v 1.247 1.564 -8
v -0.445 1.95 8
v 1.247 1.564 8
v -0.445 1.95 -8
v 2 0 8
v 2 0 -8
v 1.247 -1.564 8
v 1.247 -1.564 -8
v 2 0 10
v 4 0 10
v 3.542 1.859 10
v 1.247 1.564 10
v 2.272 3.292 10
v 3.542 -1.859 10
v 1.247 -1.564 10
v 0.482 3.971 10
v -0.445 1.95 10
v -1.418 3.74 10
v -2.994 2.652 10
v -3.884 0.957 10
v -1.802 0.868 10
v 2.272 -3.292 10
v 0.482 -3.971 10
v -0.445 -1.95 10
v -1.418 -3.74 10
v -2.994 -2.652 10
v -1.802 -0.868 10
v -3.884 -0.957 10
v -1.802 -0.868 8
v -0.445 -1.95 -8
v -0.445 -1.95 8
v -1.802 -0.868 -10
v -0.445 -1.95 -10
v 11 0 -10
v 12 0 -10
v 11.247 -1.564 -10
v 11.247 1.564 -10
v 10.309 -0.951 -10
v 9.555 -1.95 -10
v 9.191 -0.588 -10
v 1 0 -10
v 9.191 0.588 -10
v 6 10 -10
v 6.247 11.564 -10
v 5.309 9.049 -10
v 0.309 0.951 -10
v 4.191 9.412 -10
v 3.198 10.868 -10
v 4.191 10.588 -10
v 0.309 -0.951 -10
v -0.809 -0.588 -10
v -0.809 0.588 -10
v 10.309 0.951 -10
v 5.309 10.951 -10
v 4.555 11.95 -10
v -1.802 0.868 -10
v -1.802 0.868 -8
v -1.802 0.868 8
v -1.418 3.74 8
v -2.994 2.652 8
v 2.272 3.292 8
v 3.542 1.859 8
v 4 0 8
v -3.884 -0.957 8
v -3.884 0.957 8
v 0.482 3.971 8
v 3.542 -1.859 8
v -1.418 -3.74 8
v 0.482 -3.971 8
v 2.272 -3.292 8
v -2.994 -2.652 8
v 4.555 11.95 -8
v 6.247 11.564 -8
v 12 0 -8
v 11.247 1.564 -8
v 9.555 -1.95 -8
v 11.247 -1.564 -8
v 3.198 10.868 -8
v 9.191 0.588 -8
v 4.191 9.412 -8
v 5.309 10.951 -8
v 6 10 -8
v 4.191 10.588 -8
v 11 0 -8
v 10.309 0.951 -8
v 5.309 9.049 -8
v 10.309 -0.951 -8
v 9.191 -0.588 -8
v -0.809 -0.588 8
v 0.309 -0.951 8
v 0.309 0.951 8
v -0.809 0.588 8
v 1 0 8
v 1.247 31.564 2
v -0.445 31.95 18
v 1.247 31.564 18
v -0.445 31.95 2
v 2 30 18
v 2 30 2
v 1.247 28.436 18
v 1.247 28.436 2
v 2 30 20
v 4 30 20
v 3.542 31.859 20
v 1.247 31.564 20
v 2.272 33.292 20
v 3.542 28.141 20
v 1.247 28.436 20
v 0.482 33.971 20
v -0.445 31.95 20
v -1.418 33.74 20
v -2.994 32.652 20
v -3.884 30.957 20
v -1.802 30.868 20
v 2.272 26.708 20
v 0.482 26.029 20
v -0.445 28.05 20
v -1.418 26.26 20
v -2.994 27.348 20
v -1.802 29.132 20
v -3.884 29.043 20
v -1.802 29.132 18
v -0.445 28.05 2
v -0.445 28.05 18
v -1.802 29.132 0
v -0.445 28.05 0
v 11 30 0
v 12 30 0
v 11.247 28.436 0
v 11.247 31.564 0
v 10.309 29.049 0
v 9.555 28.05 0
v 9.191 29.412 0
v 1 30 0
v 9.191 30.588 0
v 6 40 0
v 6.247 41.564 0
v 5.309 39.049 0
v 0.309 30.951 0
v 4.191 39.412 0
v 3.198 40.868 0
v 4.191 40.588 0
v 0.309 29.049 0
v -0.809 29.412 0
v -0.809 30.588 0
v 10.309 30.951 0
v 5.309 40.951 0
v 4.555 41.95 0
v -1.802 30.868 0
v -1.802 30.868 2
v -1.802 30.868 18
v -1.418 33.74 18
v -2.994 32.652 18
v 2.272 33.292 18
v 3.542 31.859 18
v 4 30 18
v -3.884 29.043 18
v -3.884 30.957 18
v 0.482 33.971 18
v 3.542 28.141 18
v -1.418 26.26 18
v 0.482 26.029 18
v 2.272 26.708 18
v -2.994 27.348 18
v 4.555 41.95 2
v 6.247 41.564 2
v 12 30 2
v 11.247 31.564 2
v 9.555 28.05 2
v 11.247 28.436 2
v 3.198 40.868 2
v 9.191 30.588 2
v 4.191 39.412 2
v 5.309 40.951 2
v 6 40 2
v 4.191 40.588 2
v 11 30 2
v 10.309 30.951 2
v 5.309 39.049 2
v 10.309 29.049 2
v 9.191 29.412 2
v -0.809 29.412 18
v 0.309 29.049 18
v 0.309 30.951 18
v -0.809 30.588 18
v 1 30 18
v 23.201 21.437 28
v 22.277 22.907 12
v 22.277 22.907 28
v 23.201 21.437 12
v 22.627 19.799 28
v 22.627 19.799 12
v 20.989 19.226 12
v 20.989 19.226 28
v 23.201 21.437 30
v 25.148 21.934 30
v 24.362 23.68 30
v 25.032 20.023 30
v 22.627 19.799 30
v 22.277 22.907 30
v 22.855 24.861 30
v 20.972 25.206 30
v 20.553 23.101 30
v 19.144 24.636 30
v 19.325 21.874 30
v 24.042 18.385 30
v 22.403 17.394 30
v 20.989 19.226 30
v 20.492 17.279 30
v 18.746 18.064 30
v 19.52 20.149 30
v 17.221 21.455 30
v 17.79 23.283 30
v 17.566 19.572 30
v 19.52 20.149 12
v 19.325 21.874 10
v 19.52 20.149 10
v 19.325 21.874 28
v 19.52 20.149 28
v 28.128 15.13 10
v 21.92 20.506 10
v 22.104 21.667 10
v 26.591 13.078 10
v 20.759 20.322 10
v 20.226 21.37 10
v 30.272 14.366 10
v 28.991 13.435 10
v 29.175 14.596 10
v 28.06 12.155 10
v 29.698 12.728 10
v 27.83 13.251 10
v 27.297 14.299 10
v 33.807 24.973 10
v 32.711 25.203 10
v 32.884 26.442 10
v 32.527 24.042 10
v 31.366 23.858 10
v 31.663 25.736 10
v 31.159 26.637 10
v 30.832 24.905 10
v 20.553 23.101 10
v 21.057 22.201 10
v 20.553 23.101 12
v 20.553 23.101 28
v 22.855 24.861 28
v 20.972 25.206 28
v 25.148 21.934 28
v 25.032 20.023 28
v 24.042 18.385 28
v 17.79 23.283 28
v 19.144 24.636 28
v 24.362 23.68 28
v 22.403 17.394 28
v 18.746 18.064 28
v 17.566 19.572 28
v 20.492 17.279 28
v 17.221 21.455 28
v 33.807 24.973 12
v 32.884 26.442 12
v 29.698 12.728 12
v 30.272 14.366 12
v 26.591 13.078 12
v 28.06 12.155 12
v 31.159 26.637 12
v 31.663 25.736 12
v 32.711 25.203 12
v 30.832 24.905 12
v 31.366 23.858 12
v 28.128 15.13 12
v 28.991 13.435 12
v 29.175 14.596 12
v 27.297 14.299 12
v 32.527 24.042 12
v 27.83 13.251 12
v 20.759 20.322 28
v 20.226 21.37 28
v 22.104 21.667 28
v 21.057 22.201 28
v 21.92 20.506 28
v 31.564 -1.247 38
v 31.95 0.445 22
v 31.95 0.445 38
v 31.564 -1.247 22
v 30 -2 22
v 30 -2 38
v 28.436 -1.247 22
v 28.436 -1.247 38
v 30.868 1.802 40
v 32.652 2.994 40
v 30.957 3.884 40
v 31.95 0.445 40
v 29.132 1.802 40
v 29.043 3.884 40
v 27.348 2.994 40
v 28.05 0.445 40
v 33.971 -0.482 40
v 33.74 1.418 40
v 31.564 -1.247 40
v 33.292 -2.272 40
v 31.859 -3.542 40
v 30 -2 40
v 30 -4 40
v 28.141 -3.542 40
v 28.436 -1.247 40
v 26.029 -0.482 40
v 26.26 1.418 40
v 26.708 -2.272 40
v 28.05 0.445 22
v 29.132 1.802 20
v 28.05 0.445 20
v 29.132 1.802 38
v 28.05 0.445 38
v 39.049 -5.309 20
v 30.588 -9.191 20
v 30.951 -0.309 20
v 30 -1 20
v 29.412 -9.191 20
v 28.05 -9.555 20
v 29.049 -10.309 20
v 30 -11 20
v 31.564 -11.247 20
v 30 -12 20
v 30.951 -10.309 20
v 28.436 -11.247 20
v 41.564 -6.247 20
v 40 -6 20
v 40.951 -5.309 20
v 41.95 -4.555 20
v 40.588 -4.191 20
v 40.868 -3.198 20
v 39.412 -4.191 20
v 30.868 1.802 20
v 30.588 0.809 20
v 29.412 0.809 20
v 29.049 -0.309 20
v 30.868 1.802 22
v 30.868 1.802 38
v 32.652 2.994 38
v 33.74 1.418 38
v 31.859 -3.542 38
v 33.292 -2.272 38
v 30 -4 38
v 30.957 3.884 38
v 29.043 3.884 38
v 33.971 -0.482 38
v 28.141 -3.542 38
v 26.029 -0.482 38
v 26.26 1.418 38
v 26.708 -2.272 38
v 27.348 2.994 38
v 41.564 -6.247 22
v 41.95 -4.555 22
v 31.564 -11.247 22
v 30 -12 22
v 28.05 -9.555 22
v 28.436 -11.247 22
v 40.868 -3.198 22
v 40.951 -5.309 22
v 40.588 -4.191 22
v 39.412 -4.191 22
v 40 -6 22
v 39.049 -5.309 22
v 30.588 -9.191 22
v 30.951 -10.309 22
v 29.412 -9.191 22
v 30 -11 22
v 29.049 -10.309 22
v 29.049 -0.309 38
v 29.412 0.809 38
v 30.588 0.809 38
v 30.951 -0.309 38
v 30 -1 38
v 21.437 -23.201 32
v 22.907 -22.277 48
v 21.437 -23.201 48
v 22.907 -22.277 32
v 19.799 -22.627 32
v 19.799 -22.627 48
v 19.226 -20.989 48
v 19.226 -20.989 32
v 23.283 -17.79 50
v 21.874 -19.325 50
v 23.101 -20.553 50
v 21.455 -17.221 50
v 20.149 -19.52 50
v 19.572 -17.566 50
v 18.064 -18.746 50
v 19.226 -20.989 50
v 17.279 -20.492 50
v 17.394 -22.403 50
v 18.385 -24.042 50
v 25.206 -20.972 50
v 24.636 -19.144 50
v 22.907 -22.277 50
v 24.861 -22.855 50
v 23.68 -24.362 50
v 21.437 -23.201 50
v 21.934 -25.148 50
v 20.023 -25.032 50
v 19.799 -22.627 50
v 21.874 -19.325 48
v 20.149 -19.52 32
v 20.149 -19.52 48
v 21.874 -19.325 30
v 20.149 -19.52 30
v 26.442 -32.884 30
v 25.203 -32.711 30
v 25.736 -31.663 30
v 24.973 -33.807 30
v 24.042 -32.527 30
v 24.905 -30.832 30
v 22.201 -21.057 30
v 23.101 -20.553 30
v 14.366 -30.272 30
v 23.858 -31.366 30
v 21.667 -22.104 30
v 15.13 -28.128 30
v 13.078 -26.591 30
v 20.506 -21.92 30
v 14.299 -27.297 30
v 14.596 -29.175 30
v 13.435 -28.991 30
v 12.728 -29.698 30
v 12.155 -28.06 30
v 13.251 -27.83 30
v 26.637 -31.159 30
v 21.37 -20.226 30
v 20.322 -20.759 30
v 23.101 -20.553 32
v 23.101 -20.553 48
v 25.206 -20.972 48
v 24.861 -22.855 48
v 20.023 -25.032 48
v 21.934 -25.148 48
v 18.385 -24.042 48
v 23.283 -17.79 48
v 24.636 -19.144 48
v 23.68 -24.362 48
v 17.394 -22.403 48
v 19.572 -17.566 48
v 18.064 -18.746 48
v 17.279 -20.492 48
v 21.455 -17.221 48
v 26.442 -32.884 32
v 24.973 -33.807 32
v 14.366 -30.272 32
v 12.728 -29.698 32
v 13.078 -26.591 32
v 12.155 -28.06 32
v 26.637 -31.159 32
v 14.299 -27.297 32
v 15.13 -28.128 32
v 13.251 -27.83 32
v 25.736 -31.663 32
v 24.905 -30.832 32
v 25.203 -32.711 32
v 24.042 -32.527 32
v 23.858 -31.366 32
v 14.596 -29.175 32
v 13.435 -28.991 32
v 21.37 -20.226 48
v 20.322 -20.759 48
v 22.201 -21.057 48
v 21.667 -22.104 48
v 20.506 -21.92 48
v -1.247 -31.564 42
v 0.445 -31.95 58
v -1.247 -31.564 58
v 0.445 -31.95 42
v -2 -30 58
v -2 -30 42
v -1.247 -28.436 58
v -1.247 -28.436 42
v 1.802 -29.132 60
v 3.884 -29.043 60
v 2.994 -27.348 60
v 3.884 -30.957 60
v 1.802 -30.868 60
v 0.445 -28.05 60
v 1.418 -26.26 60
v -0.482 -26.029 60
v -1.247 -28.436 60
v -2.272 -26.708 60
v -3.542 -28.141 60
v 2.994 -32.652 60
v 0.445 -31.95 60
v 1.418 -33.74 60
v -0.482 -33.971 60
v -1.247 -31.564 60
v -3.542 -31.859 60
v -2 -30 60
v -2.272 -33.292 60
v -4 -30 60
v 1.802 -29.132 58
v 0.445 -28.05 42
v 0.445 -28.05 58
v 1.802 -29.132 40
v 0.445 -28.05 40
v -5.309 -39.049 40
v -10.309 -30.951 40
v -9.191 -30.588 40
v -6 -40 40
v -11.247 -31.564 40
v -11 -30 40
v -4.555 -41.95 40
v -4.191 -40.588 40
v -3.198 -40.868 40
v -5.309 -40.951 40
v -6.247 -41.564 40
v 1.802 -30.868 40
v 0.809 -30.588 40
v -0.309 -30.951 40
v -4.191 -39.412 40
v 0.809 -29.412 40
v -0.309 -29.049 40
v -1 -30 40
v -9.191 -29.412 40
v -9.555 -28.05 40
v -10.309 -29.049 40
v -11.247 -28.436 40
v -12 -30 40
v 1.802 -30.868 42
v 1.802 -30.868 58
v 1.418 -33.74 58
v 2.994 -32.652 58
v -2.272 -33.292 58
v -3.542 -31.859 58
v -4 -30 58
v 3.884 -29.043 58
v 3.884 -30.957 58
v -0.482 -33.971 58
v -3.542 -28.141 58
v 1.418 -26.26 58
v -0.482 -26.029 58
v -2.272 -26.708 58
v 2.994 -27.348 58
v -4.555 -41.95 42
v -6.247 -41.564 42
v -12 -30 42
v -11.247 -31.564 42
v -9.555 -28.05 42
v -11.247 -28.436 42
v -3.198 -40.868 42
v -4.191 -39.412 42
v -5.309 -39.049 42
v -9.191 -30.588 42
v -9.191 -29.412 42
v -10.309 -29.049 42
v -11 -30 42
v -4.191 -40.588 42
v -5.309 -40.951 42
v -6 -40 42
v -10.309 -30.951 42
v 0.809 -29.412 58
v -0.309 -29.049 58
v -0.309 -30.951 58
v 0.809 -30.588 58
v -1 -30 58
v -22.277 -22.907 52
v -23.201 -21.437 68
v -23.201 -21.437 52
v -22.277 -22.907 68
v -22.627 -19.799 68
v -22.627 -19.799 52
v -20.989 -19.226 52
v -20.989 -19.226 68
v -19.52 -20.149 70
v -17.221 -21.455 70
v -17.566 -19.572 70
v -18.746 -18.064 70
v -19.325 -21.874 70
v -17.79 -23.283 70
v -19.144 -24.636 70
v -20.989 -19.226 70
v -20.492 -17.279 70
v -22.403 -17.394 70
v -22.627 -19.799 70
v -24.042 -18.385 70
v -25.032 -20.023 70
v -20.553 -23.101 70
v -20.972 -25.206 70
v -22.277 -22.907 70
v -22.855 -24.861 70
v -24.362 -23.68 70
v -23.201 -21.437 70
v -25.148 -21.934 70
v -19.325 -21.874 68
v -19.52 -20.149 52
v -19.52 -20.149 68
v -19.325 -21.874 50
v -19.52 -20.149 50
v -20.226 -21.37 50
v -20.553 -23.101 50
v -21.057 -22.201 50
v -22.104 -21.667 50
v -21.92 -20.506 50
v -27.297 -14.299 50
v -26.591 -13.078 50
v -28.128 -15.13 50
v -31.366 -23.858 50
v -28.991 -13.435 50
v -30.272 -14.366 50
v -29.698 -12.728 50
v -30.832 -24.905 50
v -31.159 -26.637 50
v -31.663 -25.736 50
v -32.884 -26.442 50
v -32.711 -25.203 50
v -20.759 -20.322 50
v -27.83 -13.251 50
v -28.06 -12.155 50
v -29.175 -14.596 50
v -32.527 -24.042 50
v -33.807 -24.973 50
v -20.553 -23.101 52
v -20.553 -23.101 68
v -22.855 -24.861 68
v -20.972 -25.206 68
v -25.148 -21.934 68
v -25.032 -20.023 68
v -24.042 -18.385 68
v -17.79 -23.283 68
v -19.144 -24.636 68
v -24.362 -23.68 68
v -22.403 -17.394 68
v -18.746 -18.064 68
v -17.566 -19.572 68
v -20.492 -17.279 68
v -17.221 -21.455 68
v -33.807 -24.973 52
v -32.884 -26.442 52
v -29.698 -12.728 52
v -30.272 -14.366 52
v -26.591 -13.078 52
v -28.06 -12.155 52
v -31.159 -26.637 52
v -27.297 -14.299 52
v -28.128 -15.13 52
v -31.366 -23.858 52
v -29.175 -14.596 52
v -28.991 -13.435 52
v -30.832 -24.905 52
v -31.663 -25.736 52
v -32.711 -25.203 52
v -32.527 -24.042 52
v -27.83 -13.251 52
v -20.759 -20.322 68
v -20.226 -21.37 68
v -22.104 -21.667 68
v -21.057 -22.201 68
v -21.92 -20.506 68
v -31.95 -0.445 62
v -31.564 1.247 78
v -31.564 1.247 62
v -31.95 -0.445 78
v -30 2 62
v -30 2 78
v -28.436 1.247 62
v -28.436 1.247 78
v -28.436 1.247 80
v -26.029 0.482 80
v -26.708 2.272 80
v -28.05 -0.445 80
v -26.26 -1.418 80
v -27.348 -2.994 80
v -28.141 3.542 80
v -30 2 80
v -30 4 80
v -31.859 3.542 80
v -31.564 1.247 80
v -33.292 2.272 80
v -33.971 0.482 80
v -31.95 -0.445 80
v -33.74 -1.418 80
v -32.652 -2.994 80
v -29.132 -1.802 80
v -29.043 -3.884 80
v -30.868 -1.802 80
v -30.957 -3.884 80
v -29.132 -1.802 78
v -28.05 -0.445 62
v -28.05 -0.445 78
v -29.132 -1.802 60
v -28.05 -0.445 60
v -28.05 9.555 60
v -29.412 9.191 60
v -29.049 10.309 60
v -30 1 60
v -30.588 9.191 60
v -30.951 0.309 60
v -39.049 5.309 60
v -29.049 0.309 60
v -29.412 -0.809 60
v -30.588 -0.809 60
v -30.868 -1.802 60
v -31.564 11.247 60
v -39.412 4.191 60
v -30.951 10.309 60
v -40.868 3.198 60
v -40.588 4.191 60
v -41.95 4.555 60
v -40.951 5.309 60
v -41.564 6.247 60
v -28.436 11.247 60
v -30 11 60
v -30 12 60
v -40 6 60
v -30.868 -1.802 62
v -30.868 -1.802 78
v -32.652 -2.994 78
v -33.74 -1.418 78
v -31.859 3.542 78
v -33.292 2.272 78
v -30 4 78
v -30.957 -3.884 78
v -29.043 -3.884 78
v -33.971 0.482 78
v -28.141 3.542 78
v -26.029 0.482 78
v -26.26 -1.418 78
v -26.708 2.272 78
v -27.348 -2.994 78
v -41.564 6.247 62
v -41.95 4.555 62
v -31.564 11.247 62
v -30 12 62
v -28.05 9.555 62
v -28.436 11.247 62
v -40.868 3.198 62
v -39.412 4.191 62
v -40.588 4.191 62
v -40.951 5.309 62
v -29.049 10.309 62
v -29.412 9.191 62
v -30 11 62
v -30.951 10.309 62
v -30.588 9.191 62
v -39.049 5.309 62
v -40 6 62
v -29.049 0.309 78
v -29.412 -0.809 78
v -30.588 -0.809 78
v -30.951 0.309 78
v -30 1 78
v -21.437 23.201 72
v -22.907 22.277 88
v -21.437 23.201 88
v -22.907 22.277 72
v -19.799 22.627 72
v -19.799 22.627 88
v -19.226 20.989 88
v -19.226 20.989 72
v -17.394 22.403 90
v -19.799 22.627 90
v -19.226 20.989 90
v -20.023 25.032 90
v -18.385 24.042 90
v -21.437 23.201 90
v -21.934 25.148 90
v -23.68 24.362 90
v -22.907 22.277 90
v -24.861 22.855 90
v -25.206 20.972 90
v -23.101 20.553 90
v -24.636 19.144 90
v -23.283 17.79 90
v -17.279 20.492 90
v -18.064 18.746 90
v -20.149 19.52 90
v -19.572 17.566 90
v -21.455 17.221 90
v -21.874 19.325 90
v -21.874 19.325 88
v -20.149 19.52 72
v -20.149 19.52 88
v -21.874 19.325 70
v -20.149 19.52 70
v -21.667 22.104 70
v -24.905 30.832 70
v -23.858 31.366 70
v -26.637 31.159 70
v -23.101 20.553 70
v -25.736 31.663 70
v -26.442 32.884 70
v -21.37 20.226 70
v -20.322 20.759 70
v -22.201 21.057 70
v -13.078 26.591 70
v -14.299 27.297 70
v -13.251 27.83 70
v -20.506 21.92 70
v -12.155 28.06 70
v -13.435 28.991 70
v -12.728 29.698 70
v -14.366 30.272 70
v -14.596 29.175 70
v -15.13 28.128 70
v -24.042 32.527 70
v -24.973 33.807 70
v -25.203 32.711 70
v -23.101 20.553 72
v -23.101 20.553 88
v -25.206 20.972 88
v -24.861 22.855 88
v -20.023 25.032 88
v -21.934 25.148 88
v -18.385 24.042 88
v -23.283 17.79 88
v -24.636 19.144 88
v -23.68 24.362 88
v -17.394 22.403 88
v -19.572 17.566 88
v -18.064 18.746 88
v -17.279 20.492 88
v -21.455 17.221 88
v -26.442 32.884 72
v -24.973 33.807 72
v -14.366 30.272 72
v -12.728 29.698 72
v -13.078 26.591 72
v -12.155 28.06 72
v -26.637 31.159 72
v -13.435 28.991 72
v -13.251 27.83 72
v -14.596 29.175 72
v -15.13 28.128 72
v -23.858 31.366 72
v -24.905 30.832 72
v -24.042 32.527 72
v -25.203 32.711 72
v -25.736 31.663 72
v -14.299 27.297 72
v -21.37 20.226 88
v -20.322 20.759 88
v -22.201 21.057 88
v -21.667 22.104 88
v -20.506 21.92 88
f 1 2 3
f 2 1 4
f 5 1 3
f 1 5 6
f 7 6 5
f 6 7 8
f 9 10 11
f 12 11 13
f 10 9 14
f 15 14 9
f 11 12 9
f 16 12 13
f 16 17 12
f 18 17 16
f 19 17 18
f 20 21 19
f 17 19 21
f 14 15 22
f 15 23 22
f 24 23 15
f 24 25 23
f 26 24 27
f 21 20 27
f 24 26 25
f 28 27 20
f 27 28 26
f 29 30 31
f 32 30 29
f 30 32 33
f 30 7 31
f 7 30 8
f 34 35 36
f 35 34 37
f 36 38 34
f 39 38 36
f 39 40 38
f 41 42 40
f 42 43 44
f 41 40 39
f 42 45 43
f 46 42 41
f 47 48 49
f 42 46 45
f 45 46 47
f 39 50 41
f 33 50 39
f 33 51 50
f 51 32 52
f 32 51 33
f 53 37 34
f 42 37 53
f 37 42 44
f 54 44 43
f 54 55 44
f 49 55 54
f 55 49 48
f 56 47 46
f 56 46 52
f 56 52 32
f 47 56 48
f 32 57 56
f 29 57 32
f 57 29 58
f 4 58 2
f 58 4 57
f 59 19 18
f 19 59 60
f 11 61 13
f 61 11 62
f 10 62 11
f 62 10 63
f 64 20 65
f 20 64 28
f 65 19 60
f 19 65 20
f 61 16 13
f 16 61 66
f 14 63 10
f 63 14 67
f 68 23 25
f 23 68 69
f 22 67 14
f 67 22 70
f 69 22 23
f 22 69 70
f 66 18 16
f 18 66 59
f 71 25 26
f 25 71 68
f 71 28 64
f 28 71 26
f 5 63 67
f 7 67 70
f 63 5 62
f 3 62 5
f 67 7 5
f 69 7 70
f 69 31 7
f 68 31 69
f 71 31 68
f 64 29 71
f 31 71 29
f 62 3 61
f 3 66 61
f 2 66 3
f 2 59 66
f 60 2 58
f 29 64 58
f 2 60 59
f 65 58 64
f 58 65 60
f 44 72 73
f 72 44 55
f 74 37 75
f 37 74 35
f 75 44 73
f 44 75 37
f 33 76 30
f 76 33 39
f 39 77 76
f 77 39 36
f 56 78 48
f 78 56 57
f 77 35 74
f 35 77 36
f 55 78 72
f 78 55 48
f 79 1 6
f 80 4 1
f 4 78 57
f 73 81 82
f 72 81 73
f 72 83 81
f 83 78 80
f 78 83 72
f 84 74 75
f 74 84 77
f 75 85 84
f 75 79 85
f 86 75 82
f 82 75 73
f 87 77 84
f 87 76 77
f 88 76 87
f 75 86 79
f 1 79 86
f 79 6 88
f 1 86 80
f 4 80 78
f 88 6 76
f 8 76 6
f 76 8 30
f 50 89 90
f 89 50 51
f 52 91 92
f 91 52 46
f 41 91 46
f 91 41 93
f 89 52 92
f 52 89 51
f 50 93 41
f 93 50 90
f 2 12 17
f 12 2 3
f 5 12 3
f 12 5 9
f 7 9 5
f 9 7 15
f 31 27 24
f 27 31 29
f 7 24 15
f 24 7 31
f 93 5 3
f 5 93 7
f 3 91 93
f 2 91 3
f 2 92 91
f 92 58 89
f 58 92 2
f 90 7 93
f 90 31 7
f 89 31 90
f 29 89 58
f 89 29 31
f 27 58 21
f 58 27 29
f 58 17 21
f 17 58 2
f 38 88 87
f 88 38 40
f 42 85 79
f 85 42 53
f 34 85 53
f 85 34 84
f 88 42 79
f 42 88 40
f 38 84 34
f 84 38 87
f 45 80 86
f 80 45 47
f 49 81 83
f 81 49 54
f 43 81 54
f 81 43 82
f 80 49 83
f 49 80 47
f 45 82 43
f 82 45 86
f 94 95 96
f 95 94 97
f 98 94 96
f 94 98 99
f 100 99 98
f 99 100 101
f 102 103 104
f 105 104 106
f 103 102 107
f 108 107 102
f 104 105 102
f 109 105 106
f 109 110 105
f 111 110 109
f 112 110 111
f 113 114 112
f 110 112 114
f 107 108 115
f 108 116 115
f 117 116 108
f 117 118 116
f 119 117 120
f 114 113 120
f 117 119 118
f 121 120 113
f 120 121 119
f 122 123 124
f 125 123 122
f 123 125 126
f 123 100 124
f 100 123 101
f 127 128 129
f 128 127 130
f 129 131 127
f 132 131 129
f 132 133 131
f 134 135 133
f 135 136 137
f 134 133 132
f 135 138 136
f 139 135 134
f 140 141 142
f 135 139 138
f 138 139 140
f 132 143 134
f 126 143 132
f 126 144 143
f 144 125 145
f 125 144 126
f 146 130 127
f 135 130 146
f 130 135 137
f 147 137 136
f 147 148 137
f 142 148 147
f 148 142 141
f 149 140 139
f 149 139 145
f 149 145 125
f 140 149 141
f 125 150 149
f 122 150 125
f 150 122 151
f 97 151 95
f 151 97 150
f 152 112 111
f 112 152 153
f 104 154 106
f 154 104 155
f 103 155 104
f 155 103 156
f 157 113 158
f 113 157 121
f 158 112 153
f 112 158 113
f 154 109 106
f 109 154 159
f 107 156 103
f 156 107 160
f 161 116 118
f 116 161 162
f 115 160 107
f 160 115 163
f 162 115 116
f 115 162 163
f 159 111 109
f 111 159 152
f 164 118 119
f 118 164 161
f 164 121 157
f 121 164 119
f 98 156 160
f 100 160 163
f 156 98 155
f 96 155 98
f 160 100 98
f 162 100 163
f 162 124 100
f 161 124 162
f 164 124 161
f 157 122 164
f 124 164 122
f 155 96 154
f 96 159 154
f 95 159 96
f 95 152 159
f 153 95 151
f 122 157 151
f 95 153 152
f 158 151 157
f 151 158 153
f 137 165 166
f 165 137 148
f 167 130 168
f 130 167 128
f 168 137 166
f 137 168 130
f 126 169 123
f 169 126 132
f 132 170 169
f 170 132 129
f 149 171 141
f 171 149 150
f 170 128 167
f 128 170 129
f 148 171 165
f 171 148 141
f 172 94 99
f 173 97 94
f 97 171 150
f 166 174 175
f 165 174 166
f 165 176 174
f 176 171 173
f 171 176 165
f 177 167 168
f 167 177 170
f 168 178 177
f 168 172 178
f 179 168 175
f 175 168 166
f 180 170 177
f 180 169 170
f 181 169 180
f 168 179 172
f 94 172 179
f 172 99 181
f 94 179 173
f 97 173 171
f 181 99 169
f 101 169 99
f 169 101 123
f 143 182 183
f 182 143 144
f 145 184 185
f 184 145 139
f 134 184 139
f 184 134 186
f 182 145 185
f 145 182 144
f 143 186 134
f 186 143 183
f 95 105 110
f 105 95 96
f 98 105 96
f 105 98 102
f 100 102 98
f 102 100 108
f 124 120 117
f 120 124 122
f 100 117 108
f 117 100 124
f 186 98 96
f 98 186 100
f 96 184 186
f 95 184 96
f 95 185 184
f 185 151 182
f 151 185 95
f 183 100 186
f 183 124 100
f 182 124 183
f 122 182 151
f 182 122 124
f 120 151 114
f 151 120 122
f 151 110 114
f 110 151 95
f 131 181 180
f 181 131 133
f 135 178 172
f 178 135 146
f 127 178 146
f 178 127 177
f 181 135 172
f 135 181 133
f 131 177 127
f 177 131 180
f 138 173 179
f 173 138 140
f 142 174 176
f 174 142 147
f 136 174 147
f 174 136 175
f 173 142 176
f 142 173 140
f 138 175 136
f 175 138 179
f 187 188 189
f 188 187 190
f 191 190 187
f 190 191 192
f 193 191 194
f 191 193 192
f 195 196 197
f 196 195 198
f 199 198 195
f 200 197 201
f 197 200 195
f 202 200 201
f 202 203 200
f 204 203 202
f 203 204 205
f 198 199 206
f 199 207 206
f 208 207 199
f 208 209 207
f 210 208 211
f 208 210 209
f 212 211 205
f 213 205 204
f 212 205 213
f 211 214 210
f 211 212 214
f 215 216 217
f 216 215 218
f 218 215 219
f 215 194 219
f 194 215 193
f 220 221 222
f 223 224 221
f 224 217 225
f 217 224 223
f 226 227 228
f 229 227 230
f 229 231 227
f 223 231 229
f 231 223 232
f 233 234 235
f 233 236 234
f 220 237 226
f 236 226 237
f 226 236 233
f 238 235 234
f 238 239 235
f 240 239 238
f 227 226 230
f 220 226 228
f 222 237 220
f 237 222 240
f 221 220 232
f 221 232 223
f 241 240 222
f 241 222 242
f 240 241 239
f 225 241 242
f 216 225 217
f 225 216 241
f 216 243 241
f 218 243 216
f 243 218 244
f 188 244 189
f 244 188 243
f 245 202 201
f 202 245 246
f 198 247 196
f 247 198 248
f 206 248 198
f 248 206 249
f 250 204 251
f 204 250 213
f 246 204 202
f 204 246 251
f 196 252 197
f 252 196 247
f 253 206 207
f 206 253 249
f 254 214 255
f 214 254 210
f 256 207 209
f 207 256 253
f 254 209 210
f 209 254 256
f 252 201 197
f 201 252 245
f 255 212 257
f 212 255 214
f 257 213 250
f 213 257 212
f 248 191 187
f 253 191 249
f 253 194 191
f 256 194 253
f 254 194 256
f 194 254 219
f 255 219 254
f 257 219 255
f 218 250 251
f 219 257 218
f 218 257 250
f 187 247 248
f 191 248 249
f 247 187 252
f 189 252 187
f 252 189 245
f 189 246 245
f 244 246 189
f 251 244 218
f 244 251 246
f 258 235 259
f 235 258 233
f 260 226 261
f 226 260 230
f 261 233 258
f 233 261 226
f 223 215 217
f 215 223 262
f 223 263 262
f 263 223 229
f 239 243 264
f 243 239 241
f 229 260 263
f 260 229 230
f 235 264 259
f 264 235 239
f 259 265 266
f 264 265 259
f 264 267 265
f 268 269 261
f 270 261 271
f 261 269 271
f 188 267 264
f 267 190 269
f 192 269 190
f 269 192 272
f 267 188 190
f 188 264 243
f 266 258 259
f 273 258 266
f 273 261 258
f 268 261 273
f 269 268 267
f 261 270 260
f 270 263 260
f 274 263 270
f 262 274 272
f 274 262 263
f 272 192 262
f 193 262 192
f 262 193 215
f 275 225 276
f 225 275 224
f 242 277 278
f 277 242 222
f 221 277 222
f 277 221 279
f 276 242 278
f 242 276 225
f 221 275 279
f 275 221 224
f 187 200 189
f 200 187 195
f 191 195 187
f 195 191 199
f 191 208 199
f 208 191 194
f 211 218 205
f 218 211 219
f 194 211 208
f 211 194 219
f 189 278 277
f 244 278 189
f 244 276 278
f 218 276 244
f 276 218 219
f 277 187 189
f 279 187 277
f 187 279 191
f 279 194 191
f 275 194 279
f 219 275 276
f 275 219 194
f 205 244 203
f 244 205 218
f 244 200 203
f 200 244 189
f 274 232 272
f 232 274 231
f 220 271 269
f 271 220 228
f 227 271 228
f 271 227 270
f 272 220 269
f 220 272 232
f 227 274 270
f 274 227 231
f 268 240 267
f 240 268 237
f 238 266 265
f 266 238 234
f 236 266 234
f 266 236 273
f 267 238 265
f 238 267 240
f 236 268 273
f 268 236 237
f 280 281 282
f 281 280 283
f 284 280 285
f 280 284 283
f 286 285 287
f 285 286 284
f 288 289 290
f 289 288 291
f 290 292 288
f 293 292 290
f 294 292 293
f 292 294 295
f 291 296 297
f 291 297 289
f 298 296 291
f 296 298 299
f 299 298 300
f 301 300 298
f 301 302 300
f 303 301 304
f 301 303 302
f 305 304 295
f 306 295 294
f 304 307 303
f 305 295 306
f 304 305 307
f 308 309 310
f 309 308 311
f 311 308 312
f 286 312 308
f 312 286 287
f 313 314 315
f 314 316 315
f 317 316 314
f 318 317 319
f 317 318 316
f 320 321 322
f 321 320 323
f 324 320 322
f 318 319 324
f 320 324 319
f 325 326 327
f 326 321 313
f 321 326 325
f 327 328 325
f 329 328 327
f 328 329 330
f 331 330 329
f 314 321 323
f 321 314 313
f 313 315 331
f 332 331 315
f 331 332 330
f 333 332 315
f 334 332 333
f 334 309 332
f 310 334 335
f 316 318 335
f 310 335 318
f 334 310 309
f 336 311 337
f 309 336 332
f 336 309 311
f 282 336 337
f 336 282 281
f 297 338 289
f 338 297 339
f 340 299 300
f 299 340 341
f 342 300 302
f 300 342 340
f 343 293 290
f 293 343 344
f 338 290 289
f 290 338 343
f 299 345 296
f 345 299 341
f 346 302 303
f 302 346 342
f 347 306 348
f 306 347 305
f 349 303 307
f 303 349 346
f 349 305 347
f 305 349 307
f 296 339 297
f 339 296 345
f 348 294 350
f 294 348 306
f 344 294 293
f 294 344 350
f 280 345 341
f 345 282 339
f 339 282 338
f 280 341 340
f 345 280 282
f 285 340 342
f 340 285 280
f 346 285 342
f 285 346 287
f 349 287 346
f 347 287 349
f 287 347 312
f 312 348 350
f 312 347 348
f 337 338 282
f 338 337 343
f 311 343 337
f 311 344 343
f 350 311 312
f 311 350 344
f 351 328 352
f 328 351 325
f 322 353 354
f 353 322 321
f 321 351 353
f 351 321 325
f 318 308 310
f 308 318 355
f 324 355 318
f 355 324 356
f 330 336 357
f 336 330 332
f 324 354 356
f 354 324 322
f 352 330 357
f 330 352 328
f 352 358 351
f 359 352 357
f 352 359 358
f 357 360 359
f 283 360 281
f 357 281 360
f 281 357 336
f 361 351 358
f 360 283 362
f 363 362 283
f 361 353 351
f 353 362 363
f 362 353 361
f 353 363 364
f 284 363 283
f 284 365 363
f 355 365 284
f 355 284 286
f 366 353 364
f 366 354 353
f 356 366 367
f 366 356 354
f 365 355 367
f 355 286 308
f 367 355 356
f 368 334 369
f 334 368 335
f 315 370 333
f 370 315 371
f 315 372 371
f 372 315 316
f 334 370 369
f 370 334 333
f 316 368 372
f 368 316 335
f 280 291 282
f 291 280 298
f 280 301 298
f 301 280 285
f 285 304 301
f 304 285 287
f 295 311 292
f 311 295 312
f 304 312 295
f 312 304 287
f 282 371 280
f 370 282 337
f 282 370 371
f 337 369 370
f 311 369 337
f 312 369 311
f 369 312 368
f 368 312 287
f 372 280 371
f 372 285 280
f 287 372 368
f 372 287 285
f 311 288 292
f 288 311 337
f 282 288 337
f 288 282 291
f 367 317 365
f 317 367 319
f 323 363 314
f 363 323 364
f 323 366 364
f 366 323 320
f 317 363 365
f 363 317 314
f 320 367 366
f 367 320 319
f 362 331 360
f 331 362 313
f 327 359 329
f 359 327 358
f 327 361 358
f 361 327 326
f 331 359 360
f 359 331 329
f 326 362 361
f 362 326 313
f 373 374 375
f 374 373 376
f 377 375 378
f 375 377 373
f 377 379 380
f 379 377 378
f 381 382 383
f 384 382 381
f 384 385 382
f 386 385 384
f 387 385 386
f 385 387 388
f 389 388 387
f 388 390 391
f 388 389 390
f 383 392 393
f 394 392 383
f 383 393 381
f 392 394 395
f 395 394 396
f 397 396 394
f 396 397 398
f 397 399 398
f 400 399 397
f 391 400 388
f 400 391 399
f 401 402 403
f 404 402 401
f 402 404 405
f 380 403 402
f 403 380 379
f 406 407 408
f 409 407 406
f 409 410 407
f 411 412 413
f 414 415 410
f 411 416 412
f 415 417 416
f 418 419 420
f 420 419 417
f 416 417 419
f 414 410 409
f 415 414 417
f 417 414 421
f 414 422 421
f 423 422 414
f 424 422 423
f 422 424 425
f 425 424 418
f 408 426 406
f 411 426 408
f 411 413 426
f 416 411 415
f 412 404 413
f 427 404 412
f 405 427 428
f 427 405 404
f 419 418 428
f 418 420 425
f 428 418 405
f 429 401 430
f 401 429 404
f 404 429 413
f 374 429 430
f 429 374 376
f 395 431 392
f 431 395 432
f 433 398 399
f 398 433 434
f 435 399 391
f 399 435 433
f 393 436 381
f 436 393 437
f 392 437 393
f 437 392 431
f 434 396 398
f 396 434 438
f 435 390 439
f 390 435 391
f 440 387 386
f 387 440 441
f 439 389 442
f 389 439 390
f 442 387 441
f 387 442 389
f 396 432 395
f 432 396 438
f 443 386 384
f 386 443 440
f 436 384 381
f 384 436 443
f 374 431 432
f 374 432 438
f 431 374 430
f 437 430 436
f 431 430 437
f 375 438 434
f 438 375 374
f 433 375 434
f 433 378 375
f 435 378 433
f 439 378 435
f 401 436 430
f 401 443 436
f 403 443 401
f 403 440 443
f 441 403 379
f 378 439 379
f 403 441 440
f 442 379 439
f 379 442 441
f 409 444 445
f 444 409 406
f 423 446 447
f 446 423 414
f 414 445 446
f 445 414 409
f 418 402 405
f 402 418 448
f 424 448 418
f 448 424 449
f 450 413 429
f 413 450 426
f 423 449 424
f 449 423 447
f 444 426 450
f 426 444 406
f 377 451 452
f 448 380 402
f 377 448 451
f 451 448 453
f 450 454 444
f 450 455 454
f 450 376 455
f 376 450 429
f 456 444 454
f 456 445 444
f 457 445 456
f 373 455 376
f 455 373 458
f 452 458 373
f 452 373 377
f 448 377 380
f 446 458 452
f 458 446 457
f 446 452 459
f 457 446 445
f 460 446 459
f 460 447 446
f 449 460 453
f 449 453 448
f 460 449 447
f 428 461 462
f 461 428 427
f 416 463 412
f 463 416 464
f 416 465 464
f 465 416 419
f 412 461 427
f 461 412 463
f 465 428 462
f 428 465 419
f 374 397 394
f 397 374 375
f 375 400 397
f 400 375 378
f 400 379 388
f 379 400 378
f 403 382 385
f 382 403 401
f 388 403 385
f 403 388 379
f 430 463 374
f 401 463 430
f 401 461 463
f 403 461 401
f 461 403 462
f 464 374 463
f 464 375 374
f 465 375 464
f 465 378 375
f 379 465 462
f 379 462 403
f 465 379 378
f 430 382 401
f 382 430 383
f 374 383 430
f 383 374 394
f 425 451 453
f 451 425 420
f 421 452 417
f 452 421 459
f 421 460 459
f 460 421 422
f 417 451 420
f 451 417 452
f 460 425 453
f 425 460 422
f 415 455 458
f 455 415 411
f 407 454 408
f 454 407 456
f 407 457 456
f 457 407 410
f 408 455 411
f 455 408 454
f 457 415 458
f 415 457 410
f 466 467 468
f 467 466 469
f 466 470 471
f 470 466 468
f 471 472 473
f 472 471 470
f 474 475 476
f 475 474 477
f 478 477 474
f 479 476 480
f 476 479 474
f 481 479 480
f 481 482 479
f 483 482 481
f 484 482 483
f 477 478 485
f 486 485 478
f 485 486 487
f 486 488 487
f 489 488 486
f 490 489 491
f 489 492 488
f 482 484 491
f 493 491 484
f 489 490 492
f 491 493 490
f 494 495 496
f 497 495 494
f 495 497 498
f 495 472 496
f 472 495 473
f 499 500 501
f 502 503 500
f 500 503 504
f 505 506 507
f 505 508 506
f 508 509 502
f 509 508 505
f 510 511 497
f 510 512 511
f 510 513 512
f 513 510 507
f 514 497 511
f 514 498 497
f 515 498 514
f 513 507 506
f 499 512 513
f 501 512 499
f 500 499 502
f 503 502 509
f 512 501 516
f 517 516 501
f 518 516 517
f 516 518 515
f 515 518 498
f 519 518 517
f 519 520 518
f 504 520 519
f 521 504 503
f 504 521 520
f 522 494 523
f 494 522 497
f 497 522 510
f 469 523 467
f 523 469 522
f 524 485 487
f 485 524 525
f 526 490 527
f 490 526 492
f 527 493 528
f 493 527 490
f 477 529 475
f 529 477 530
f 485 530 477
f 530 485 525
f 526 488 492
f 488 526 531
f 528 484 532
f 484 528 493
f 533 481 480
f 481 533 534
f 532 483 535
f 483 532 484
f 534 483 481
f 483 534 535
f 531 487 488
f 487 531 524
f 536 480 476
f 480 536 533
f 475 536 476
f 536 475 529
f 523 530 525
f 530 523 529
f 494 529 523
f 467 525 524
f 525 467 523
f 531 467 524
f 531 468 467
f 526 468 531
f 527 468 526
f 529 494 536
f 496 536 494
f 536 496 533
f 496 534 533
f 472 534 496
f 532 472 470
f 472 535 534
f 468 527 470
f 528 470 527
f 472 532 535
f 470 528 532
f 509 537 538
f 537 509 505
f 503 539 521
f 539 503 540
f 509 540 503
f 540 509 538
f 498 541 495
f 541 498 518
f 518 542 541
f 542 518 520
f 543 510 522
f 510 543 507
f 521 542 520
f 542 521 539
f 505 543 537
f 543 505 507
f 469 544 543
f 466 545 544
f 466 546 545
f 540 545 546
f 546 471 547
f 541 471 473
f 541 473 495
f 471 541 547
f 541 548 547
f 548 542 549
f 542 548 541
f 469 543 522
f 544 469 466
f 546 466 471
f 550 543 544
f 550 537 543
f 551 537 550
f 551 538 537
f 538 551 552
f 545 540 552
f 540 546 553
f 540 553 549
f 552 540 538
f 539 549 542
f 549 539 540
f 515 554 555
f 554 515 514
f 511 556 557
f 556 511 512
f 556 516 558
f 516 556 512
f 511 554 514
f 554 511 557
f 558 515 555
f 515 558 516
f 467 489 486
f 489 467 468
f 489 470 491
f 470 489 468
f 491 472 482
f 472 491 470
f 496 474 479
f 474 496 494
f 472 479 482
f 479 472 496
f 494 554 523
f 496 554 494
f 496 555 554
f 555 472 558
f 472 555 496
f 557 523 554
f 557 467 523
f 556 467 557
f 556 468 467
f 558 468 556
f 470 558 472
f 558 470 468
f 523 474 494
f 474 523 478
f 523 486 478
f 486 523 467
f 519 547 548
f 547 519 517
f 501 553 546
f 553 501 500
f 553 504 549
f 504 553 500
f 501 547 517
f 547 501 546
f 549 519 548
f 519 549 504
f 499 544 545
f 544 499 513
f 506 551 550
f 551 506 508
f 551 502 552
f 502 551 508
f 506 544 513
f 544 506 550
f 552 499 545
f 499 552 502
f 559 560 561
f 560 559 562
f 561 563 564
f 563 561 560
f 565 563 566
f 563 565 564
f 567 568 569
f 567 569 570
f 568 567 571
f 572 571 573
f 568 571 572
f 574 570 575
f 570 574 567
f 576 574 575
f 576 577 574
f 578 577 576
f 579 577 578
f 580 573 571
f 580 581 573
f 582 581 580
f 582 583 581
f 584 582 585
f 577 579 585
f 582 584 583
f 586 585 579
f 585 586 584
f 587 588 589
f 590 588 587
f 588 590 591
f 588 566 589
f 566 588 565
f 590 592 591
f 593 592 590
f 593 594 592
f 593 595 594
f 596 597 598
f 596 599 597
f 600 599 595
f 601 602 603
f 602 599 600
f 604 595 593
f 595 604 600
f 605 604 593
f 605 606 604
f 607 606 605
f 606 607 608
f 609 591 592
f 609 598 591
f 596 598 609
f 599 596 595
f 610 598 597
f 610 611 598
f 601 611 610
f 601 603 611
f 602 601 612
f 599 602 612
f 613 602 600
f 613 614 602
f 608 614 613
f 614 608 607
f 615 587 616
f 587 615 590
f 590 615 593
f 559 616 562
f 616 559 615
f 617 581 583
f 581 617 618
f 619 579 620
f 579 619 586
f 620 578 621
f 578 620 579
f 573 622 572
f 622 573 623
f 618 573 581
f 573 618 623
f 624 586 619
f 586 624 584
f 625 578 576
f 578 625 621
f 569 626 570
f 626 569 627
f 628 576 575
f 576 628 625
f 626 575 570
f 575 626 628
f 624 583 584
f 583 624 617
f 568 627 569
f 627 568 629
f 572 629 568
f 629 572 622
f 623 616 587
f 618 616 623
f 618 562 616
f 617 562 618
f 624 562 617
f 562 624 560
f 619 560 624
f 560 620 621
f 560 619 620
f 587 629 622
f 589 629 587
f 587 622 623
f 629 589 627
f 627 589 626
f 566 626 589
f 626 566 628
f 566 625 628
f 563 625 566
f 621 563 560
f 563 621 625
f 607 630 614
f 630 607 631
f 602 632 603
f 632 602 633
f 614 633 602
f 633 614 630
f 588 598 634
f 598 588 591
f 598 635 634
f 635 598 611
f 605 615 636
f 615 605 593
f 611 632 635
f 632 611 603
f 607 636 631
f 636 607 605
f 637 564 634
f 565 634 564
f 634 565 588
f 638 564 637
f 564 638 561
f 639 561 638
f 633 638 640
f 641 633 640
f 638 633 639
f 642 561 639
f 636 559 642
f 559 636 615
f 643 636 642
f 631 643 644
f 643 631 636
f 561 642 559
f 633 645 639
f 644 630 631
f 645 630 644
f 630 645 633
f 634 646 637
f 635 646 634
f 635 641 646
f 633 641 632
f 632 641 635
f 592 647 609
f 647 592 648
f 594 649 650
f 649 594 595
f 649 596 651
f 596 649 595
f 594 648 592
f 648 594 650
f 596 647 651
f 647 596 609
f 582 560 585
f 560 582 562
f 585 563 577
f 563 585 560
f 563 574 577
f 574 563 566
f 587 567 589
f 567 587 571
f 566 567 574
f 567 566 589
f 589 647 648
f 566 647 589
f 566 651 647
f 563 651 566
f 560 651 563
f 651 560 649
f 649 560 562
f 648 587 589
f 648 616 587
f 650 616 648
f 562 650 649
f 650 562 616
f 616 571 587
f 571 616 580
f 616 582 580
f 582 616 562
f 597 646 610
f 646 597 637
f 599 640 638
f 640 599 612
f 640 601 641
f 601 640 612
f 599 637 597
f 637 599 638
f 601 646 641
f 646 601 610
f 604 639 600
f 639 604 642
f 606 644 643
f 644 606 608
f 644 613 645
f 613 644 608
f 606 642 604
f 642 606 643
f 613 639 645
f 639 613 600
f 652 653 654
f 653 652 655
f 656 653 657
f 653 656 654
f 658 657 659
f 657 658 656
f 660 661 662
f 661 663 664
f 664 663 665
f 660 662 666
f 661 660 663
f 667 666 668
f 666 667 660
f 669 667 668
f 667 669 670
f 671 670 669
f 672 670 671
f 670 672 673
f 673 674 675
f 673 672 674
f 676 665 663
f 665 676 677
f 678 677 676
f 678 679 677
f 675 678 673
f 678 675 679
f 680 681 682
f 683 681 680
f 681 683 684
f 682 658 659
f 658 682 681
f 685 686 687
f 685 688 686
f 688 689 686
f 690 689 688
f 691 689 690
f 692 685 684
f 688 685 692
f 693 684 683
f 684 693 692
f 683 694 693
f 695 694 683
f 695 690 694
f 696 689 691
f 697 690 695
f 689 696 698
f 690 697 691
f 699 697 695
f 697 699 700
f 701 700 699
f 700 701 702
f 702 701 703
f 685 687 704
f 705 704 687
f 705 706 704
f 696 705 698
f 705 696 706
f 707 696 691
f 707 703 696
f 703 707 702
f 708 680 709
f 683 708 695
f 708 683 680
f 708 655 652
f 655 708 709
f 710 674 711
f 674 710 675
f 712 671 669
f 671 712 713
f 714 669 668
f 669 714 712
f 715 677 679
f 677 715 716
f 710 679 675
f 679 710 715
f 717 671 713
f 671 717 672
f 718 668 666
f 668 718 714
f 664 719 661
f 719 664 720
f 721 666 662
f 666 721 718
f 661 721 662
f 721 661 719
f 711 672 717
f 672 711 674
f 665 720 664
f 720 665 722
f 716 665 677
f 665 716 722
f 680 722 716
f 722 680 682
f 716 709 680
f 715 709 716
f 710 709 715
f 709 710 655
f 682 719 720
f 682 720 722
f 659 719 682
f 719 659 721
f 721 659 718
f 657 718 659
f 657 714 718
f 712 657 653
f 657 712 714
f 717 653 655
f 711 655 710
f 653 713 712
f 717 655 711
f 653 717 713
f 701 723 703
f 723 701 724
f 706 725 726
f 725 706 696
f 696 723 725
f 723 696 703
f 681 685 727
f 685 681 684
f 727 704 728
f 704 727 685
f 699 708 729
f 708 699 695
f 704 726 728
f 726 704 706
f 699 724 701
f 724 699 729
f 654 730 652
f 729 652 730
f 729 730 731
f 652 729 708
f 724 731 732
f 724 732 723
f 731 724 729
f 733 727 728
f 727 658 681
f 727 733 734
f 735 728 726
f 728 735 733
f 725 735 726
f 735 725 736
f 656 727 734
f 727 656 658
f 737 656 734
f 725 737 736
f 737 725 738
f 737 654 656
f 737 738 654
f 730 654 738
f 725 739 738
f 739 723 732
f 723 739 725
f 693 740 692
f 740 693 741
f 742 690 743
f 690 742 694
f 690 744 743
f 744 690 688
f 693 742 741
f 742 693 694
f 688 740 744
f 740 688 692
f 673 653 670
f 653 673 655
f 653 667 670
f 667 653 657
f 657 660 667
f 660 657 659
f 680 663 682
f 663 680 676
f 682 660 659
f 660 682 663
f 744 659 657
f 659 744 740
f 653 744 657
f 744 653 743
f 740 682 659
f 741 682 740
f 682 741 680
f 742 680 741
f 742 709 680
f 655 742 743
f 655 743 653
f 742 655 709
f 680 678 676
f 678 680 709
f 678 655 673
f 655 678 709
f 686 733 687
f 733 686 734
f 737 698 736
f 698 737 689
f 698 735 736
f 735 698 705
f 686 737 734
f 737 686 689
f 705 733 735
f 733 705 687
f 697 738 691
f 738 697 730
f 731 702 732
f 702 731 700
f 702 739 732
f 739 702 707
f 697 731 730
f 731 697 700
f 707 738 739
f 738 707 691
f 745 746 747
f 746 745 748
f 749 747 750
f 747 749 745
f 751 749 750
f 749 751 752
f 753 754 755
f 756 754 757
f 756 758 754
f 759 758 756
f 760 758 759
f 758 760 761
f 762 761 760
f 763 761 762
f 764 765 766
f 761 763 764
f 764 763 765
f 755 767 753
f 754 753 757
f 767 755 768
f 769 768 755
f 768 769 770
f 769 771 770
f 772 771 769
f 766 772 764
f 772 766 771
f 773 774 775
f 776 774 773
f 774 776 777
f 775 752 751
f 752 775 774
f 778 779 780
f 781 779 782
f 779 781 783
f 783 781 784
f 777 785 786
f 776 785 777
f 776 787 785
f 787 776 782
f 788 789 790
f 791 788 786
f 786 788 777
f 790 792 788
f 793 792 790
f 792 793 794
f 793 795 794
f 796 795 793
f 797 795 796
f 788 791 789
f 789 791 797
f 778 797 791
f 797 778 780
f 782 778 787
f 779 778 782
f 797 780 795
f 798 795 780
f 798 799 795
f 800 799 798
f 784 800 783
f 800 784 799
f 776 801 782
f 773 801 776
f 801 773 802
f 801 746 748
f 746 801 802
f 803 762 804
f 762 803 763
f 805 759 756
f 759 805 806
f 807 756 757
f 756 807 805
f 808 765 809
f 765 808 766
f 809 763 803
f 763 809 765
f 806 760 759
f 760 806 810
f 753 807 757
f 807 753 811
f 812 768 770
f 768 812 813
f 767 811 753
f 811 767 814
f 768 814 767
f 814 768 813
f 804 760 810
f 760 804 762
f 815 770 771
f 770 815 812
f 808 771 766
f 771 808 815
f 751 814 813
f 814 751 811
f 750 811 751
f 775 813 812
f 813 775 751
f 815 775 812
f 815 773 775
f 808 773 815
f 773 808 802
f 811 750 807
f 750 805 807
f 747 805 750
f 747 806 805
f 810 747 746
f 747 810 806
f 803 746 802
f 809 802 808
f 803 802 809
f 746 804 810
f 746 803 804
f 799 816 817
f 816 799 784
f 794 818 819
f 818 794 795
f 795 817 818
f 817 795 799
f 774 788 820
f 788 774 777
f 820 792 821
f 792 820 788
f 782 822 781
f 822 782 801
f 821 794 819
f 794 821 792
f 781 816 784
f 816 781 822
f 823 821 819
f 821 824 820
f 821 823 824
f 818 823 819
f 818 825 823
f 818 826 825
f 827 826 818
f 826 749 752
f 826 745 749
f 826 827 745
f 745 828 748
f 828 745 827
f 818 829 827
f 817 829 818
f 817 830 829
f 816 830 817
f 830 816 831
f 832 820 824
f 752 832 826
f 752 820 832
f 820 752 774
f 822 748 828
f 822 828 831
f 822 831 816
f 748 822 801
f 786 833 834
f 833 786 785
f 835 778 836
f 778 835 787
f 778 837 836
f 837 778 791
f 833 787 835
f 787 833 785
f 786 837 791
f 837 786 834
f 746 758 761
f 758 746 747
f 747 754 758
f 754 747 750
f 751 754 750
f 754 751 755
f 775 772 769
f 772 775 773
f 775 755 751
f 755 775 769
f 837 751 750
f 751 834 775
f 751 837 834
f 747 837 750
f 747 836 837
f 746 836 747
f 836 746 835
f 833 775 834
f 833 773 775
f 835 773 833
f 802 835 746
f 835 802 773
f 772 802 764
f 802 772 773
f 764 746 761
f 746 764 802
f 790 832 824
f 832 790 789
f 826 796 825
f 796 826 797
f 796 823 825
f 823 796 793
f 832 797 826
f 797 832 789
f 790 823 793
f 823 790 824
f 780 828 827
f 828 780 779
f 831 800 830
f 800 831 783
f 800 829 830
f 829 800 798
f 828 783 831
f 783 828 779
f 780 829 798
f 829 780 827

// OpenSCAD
/*

Sage Ridge Robotics OpenSCAD file.
Christopher von Nagy, July 2014.

Example 06 modules.

*/

// Modules
// OpenSCAD allows us to define modules. The module()
// command creates named objects that can be used elsewhere
// in your design code. While it is entirely up to you where
// you place module() definitions, I like to put them toward
// the end of a project. In a more complex project, modules()
// can be placed in separate files and "included" into
// the main project file.

// Look at the bottom of this file for the definition
// of the object used here, a complex widget.
translate([0,0,0]) acme_widget_22();

// Here's an example of the acme_widget_22() module
// used in a programatic construct. First, the location
// of the group is set to (0, -100, 10) and then the
// group is constructed.

// The sine of the angle, i * 45, is used
// to calculate x, and the cosine, y. Multiplying a
// constant, 10, by i increases z with each step.

hypothenuse = 30;
step_angle = 45;
translate([0,0,10])
for (i = [0 : 7])
{

    translate([
                  (sin(i * step_angle) * hypothenuse),
                  (cos(i * step_angle) * hypothenuse),
                  (i * 10)
              ])
    rotate(i*-45,0,0)
    acme_widget_22();

};

/*

Define modules

We define larger modules used in code examples above in this section.

These modules include the

   acme_widget22() module
   match_box() module
   box_of_many_sizes()


*/


// The acme_widget_22() module
module acme_widget_22()
{
i = -10;
difference()
{

    union()
    {
        cylinder(r=2, h=20, center=true);
        translate([0,0,8]) cylinder(r=4,h=2);
        hull ()
        {
            translate([0,0,i]) cylinder(r=2,h=2);
            translate([10,0,i]) cylinder(r=2,h=2);
            translate([5,10,i]) cylinder(r=2,h=2);
        }
    }

# cylinder(r=1, h=22, center=true);
# translate([0,0,8]) cylinder(r=2, h=2);
# translate([10,0,i-1]) cylinder(r=1,h=4);
# translate([5,10,i-1]) cylinder(r=1,h=4);

}
}


// The match_box module
module match_box()
{
difference()
{
    cube([40,20,10], center=true);
    translate([0,0,1]) cube([38,18,10], center=true);
}
translate([-60,100,15])
union()
{
    cube([40,20,2], center=true);
    translate(0,0,0) cube([38,18,4], center=true);
}
}


// The box_of_many_sizes() module
module box_of_many_sizes(

        // sensible default values
        width = 60,
        length = 100,
        height = 40,

    )
{

wall_thickness = 2;

translate([0,0,height/2])
difference()
{
    cube([width,length,height], center=true);
    translate([0,0,4]) cube([
                                width-(2 * wall_thickness),
                                length-(2 * wall_thickness),
                                height-(2 * wall_thickness)],
                            center=true);

}
}


/*

License code:

Creative Commons Atribution 4.0

Attribution — You must give appropriate credit, provide a link to the license, and indicate if changes were made. You may do so in any reasonable manner, but not in any way that suggests the licensor endorses you or your use.

No additional restrictions — You may not apply legal terms or technological measures that legally restrict others from doing anything the license permits.


*/
